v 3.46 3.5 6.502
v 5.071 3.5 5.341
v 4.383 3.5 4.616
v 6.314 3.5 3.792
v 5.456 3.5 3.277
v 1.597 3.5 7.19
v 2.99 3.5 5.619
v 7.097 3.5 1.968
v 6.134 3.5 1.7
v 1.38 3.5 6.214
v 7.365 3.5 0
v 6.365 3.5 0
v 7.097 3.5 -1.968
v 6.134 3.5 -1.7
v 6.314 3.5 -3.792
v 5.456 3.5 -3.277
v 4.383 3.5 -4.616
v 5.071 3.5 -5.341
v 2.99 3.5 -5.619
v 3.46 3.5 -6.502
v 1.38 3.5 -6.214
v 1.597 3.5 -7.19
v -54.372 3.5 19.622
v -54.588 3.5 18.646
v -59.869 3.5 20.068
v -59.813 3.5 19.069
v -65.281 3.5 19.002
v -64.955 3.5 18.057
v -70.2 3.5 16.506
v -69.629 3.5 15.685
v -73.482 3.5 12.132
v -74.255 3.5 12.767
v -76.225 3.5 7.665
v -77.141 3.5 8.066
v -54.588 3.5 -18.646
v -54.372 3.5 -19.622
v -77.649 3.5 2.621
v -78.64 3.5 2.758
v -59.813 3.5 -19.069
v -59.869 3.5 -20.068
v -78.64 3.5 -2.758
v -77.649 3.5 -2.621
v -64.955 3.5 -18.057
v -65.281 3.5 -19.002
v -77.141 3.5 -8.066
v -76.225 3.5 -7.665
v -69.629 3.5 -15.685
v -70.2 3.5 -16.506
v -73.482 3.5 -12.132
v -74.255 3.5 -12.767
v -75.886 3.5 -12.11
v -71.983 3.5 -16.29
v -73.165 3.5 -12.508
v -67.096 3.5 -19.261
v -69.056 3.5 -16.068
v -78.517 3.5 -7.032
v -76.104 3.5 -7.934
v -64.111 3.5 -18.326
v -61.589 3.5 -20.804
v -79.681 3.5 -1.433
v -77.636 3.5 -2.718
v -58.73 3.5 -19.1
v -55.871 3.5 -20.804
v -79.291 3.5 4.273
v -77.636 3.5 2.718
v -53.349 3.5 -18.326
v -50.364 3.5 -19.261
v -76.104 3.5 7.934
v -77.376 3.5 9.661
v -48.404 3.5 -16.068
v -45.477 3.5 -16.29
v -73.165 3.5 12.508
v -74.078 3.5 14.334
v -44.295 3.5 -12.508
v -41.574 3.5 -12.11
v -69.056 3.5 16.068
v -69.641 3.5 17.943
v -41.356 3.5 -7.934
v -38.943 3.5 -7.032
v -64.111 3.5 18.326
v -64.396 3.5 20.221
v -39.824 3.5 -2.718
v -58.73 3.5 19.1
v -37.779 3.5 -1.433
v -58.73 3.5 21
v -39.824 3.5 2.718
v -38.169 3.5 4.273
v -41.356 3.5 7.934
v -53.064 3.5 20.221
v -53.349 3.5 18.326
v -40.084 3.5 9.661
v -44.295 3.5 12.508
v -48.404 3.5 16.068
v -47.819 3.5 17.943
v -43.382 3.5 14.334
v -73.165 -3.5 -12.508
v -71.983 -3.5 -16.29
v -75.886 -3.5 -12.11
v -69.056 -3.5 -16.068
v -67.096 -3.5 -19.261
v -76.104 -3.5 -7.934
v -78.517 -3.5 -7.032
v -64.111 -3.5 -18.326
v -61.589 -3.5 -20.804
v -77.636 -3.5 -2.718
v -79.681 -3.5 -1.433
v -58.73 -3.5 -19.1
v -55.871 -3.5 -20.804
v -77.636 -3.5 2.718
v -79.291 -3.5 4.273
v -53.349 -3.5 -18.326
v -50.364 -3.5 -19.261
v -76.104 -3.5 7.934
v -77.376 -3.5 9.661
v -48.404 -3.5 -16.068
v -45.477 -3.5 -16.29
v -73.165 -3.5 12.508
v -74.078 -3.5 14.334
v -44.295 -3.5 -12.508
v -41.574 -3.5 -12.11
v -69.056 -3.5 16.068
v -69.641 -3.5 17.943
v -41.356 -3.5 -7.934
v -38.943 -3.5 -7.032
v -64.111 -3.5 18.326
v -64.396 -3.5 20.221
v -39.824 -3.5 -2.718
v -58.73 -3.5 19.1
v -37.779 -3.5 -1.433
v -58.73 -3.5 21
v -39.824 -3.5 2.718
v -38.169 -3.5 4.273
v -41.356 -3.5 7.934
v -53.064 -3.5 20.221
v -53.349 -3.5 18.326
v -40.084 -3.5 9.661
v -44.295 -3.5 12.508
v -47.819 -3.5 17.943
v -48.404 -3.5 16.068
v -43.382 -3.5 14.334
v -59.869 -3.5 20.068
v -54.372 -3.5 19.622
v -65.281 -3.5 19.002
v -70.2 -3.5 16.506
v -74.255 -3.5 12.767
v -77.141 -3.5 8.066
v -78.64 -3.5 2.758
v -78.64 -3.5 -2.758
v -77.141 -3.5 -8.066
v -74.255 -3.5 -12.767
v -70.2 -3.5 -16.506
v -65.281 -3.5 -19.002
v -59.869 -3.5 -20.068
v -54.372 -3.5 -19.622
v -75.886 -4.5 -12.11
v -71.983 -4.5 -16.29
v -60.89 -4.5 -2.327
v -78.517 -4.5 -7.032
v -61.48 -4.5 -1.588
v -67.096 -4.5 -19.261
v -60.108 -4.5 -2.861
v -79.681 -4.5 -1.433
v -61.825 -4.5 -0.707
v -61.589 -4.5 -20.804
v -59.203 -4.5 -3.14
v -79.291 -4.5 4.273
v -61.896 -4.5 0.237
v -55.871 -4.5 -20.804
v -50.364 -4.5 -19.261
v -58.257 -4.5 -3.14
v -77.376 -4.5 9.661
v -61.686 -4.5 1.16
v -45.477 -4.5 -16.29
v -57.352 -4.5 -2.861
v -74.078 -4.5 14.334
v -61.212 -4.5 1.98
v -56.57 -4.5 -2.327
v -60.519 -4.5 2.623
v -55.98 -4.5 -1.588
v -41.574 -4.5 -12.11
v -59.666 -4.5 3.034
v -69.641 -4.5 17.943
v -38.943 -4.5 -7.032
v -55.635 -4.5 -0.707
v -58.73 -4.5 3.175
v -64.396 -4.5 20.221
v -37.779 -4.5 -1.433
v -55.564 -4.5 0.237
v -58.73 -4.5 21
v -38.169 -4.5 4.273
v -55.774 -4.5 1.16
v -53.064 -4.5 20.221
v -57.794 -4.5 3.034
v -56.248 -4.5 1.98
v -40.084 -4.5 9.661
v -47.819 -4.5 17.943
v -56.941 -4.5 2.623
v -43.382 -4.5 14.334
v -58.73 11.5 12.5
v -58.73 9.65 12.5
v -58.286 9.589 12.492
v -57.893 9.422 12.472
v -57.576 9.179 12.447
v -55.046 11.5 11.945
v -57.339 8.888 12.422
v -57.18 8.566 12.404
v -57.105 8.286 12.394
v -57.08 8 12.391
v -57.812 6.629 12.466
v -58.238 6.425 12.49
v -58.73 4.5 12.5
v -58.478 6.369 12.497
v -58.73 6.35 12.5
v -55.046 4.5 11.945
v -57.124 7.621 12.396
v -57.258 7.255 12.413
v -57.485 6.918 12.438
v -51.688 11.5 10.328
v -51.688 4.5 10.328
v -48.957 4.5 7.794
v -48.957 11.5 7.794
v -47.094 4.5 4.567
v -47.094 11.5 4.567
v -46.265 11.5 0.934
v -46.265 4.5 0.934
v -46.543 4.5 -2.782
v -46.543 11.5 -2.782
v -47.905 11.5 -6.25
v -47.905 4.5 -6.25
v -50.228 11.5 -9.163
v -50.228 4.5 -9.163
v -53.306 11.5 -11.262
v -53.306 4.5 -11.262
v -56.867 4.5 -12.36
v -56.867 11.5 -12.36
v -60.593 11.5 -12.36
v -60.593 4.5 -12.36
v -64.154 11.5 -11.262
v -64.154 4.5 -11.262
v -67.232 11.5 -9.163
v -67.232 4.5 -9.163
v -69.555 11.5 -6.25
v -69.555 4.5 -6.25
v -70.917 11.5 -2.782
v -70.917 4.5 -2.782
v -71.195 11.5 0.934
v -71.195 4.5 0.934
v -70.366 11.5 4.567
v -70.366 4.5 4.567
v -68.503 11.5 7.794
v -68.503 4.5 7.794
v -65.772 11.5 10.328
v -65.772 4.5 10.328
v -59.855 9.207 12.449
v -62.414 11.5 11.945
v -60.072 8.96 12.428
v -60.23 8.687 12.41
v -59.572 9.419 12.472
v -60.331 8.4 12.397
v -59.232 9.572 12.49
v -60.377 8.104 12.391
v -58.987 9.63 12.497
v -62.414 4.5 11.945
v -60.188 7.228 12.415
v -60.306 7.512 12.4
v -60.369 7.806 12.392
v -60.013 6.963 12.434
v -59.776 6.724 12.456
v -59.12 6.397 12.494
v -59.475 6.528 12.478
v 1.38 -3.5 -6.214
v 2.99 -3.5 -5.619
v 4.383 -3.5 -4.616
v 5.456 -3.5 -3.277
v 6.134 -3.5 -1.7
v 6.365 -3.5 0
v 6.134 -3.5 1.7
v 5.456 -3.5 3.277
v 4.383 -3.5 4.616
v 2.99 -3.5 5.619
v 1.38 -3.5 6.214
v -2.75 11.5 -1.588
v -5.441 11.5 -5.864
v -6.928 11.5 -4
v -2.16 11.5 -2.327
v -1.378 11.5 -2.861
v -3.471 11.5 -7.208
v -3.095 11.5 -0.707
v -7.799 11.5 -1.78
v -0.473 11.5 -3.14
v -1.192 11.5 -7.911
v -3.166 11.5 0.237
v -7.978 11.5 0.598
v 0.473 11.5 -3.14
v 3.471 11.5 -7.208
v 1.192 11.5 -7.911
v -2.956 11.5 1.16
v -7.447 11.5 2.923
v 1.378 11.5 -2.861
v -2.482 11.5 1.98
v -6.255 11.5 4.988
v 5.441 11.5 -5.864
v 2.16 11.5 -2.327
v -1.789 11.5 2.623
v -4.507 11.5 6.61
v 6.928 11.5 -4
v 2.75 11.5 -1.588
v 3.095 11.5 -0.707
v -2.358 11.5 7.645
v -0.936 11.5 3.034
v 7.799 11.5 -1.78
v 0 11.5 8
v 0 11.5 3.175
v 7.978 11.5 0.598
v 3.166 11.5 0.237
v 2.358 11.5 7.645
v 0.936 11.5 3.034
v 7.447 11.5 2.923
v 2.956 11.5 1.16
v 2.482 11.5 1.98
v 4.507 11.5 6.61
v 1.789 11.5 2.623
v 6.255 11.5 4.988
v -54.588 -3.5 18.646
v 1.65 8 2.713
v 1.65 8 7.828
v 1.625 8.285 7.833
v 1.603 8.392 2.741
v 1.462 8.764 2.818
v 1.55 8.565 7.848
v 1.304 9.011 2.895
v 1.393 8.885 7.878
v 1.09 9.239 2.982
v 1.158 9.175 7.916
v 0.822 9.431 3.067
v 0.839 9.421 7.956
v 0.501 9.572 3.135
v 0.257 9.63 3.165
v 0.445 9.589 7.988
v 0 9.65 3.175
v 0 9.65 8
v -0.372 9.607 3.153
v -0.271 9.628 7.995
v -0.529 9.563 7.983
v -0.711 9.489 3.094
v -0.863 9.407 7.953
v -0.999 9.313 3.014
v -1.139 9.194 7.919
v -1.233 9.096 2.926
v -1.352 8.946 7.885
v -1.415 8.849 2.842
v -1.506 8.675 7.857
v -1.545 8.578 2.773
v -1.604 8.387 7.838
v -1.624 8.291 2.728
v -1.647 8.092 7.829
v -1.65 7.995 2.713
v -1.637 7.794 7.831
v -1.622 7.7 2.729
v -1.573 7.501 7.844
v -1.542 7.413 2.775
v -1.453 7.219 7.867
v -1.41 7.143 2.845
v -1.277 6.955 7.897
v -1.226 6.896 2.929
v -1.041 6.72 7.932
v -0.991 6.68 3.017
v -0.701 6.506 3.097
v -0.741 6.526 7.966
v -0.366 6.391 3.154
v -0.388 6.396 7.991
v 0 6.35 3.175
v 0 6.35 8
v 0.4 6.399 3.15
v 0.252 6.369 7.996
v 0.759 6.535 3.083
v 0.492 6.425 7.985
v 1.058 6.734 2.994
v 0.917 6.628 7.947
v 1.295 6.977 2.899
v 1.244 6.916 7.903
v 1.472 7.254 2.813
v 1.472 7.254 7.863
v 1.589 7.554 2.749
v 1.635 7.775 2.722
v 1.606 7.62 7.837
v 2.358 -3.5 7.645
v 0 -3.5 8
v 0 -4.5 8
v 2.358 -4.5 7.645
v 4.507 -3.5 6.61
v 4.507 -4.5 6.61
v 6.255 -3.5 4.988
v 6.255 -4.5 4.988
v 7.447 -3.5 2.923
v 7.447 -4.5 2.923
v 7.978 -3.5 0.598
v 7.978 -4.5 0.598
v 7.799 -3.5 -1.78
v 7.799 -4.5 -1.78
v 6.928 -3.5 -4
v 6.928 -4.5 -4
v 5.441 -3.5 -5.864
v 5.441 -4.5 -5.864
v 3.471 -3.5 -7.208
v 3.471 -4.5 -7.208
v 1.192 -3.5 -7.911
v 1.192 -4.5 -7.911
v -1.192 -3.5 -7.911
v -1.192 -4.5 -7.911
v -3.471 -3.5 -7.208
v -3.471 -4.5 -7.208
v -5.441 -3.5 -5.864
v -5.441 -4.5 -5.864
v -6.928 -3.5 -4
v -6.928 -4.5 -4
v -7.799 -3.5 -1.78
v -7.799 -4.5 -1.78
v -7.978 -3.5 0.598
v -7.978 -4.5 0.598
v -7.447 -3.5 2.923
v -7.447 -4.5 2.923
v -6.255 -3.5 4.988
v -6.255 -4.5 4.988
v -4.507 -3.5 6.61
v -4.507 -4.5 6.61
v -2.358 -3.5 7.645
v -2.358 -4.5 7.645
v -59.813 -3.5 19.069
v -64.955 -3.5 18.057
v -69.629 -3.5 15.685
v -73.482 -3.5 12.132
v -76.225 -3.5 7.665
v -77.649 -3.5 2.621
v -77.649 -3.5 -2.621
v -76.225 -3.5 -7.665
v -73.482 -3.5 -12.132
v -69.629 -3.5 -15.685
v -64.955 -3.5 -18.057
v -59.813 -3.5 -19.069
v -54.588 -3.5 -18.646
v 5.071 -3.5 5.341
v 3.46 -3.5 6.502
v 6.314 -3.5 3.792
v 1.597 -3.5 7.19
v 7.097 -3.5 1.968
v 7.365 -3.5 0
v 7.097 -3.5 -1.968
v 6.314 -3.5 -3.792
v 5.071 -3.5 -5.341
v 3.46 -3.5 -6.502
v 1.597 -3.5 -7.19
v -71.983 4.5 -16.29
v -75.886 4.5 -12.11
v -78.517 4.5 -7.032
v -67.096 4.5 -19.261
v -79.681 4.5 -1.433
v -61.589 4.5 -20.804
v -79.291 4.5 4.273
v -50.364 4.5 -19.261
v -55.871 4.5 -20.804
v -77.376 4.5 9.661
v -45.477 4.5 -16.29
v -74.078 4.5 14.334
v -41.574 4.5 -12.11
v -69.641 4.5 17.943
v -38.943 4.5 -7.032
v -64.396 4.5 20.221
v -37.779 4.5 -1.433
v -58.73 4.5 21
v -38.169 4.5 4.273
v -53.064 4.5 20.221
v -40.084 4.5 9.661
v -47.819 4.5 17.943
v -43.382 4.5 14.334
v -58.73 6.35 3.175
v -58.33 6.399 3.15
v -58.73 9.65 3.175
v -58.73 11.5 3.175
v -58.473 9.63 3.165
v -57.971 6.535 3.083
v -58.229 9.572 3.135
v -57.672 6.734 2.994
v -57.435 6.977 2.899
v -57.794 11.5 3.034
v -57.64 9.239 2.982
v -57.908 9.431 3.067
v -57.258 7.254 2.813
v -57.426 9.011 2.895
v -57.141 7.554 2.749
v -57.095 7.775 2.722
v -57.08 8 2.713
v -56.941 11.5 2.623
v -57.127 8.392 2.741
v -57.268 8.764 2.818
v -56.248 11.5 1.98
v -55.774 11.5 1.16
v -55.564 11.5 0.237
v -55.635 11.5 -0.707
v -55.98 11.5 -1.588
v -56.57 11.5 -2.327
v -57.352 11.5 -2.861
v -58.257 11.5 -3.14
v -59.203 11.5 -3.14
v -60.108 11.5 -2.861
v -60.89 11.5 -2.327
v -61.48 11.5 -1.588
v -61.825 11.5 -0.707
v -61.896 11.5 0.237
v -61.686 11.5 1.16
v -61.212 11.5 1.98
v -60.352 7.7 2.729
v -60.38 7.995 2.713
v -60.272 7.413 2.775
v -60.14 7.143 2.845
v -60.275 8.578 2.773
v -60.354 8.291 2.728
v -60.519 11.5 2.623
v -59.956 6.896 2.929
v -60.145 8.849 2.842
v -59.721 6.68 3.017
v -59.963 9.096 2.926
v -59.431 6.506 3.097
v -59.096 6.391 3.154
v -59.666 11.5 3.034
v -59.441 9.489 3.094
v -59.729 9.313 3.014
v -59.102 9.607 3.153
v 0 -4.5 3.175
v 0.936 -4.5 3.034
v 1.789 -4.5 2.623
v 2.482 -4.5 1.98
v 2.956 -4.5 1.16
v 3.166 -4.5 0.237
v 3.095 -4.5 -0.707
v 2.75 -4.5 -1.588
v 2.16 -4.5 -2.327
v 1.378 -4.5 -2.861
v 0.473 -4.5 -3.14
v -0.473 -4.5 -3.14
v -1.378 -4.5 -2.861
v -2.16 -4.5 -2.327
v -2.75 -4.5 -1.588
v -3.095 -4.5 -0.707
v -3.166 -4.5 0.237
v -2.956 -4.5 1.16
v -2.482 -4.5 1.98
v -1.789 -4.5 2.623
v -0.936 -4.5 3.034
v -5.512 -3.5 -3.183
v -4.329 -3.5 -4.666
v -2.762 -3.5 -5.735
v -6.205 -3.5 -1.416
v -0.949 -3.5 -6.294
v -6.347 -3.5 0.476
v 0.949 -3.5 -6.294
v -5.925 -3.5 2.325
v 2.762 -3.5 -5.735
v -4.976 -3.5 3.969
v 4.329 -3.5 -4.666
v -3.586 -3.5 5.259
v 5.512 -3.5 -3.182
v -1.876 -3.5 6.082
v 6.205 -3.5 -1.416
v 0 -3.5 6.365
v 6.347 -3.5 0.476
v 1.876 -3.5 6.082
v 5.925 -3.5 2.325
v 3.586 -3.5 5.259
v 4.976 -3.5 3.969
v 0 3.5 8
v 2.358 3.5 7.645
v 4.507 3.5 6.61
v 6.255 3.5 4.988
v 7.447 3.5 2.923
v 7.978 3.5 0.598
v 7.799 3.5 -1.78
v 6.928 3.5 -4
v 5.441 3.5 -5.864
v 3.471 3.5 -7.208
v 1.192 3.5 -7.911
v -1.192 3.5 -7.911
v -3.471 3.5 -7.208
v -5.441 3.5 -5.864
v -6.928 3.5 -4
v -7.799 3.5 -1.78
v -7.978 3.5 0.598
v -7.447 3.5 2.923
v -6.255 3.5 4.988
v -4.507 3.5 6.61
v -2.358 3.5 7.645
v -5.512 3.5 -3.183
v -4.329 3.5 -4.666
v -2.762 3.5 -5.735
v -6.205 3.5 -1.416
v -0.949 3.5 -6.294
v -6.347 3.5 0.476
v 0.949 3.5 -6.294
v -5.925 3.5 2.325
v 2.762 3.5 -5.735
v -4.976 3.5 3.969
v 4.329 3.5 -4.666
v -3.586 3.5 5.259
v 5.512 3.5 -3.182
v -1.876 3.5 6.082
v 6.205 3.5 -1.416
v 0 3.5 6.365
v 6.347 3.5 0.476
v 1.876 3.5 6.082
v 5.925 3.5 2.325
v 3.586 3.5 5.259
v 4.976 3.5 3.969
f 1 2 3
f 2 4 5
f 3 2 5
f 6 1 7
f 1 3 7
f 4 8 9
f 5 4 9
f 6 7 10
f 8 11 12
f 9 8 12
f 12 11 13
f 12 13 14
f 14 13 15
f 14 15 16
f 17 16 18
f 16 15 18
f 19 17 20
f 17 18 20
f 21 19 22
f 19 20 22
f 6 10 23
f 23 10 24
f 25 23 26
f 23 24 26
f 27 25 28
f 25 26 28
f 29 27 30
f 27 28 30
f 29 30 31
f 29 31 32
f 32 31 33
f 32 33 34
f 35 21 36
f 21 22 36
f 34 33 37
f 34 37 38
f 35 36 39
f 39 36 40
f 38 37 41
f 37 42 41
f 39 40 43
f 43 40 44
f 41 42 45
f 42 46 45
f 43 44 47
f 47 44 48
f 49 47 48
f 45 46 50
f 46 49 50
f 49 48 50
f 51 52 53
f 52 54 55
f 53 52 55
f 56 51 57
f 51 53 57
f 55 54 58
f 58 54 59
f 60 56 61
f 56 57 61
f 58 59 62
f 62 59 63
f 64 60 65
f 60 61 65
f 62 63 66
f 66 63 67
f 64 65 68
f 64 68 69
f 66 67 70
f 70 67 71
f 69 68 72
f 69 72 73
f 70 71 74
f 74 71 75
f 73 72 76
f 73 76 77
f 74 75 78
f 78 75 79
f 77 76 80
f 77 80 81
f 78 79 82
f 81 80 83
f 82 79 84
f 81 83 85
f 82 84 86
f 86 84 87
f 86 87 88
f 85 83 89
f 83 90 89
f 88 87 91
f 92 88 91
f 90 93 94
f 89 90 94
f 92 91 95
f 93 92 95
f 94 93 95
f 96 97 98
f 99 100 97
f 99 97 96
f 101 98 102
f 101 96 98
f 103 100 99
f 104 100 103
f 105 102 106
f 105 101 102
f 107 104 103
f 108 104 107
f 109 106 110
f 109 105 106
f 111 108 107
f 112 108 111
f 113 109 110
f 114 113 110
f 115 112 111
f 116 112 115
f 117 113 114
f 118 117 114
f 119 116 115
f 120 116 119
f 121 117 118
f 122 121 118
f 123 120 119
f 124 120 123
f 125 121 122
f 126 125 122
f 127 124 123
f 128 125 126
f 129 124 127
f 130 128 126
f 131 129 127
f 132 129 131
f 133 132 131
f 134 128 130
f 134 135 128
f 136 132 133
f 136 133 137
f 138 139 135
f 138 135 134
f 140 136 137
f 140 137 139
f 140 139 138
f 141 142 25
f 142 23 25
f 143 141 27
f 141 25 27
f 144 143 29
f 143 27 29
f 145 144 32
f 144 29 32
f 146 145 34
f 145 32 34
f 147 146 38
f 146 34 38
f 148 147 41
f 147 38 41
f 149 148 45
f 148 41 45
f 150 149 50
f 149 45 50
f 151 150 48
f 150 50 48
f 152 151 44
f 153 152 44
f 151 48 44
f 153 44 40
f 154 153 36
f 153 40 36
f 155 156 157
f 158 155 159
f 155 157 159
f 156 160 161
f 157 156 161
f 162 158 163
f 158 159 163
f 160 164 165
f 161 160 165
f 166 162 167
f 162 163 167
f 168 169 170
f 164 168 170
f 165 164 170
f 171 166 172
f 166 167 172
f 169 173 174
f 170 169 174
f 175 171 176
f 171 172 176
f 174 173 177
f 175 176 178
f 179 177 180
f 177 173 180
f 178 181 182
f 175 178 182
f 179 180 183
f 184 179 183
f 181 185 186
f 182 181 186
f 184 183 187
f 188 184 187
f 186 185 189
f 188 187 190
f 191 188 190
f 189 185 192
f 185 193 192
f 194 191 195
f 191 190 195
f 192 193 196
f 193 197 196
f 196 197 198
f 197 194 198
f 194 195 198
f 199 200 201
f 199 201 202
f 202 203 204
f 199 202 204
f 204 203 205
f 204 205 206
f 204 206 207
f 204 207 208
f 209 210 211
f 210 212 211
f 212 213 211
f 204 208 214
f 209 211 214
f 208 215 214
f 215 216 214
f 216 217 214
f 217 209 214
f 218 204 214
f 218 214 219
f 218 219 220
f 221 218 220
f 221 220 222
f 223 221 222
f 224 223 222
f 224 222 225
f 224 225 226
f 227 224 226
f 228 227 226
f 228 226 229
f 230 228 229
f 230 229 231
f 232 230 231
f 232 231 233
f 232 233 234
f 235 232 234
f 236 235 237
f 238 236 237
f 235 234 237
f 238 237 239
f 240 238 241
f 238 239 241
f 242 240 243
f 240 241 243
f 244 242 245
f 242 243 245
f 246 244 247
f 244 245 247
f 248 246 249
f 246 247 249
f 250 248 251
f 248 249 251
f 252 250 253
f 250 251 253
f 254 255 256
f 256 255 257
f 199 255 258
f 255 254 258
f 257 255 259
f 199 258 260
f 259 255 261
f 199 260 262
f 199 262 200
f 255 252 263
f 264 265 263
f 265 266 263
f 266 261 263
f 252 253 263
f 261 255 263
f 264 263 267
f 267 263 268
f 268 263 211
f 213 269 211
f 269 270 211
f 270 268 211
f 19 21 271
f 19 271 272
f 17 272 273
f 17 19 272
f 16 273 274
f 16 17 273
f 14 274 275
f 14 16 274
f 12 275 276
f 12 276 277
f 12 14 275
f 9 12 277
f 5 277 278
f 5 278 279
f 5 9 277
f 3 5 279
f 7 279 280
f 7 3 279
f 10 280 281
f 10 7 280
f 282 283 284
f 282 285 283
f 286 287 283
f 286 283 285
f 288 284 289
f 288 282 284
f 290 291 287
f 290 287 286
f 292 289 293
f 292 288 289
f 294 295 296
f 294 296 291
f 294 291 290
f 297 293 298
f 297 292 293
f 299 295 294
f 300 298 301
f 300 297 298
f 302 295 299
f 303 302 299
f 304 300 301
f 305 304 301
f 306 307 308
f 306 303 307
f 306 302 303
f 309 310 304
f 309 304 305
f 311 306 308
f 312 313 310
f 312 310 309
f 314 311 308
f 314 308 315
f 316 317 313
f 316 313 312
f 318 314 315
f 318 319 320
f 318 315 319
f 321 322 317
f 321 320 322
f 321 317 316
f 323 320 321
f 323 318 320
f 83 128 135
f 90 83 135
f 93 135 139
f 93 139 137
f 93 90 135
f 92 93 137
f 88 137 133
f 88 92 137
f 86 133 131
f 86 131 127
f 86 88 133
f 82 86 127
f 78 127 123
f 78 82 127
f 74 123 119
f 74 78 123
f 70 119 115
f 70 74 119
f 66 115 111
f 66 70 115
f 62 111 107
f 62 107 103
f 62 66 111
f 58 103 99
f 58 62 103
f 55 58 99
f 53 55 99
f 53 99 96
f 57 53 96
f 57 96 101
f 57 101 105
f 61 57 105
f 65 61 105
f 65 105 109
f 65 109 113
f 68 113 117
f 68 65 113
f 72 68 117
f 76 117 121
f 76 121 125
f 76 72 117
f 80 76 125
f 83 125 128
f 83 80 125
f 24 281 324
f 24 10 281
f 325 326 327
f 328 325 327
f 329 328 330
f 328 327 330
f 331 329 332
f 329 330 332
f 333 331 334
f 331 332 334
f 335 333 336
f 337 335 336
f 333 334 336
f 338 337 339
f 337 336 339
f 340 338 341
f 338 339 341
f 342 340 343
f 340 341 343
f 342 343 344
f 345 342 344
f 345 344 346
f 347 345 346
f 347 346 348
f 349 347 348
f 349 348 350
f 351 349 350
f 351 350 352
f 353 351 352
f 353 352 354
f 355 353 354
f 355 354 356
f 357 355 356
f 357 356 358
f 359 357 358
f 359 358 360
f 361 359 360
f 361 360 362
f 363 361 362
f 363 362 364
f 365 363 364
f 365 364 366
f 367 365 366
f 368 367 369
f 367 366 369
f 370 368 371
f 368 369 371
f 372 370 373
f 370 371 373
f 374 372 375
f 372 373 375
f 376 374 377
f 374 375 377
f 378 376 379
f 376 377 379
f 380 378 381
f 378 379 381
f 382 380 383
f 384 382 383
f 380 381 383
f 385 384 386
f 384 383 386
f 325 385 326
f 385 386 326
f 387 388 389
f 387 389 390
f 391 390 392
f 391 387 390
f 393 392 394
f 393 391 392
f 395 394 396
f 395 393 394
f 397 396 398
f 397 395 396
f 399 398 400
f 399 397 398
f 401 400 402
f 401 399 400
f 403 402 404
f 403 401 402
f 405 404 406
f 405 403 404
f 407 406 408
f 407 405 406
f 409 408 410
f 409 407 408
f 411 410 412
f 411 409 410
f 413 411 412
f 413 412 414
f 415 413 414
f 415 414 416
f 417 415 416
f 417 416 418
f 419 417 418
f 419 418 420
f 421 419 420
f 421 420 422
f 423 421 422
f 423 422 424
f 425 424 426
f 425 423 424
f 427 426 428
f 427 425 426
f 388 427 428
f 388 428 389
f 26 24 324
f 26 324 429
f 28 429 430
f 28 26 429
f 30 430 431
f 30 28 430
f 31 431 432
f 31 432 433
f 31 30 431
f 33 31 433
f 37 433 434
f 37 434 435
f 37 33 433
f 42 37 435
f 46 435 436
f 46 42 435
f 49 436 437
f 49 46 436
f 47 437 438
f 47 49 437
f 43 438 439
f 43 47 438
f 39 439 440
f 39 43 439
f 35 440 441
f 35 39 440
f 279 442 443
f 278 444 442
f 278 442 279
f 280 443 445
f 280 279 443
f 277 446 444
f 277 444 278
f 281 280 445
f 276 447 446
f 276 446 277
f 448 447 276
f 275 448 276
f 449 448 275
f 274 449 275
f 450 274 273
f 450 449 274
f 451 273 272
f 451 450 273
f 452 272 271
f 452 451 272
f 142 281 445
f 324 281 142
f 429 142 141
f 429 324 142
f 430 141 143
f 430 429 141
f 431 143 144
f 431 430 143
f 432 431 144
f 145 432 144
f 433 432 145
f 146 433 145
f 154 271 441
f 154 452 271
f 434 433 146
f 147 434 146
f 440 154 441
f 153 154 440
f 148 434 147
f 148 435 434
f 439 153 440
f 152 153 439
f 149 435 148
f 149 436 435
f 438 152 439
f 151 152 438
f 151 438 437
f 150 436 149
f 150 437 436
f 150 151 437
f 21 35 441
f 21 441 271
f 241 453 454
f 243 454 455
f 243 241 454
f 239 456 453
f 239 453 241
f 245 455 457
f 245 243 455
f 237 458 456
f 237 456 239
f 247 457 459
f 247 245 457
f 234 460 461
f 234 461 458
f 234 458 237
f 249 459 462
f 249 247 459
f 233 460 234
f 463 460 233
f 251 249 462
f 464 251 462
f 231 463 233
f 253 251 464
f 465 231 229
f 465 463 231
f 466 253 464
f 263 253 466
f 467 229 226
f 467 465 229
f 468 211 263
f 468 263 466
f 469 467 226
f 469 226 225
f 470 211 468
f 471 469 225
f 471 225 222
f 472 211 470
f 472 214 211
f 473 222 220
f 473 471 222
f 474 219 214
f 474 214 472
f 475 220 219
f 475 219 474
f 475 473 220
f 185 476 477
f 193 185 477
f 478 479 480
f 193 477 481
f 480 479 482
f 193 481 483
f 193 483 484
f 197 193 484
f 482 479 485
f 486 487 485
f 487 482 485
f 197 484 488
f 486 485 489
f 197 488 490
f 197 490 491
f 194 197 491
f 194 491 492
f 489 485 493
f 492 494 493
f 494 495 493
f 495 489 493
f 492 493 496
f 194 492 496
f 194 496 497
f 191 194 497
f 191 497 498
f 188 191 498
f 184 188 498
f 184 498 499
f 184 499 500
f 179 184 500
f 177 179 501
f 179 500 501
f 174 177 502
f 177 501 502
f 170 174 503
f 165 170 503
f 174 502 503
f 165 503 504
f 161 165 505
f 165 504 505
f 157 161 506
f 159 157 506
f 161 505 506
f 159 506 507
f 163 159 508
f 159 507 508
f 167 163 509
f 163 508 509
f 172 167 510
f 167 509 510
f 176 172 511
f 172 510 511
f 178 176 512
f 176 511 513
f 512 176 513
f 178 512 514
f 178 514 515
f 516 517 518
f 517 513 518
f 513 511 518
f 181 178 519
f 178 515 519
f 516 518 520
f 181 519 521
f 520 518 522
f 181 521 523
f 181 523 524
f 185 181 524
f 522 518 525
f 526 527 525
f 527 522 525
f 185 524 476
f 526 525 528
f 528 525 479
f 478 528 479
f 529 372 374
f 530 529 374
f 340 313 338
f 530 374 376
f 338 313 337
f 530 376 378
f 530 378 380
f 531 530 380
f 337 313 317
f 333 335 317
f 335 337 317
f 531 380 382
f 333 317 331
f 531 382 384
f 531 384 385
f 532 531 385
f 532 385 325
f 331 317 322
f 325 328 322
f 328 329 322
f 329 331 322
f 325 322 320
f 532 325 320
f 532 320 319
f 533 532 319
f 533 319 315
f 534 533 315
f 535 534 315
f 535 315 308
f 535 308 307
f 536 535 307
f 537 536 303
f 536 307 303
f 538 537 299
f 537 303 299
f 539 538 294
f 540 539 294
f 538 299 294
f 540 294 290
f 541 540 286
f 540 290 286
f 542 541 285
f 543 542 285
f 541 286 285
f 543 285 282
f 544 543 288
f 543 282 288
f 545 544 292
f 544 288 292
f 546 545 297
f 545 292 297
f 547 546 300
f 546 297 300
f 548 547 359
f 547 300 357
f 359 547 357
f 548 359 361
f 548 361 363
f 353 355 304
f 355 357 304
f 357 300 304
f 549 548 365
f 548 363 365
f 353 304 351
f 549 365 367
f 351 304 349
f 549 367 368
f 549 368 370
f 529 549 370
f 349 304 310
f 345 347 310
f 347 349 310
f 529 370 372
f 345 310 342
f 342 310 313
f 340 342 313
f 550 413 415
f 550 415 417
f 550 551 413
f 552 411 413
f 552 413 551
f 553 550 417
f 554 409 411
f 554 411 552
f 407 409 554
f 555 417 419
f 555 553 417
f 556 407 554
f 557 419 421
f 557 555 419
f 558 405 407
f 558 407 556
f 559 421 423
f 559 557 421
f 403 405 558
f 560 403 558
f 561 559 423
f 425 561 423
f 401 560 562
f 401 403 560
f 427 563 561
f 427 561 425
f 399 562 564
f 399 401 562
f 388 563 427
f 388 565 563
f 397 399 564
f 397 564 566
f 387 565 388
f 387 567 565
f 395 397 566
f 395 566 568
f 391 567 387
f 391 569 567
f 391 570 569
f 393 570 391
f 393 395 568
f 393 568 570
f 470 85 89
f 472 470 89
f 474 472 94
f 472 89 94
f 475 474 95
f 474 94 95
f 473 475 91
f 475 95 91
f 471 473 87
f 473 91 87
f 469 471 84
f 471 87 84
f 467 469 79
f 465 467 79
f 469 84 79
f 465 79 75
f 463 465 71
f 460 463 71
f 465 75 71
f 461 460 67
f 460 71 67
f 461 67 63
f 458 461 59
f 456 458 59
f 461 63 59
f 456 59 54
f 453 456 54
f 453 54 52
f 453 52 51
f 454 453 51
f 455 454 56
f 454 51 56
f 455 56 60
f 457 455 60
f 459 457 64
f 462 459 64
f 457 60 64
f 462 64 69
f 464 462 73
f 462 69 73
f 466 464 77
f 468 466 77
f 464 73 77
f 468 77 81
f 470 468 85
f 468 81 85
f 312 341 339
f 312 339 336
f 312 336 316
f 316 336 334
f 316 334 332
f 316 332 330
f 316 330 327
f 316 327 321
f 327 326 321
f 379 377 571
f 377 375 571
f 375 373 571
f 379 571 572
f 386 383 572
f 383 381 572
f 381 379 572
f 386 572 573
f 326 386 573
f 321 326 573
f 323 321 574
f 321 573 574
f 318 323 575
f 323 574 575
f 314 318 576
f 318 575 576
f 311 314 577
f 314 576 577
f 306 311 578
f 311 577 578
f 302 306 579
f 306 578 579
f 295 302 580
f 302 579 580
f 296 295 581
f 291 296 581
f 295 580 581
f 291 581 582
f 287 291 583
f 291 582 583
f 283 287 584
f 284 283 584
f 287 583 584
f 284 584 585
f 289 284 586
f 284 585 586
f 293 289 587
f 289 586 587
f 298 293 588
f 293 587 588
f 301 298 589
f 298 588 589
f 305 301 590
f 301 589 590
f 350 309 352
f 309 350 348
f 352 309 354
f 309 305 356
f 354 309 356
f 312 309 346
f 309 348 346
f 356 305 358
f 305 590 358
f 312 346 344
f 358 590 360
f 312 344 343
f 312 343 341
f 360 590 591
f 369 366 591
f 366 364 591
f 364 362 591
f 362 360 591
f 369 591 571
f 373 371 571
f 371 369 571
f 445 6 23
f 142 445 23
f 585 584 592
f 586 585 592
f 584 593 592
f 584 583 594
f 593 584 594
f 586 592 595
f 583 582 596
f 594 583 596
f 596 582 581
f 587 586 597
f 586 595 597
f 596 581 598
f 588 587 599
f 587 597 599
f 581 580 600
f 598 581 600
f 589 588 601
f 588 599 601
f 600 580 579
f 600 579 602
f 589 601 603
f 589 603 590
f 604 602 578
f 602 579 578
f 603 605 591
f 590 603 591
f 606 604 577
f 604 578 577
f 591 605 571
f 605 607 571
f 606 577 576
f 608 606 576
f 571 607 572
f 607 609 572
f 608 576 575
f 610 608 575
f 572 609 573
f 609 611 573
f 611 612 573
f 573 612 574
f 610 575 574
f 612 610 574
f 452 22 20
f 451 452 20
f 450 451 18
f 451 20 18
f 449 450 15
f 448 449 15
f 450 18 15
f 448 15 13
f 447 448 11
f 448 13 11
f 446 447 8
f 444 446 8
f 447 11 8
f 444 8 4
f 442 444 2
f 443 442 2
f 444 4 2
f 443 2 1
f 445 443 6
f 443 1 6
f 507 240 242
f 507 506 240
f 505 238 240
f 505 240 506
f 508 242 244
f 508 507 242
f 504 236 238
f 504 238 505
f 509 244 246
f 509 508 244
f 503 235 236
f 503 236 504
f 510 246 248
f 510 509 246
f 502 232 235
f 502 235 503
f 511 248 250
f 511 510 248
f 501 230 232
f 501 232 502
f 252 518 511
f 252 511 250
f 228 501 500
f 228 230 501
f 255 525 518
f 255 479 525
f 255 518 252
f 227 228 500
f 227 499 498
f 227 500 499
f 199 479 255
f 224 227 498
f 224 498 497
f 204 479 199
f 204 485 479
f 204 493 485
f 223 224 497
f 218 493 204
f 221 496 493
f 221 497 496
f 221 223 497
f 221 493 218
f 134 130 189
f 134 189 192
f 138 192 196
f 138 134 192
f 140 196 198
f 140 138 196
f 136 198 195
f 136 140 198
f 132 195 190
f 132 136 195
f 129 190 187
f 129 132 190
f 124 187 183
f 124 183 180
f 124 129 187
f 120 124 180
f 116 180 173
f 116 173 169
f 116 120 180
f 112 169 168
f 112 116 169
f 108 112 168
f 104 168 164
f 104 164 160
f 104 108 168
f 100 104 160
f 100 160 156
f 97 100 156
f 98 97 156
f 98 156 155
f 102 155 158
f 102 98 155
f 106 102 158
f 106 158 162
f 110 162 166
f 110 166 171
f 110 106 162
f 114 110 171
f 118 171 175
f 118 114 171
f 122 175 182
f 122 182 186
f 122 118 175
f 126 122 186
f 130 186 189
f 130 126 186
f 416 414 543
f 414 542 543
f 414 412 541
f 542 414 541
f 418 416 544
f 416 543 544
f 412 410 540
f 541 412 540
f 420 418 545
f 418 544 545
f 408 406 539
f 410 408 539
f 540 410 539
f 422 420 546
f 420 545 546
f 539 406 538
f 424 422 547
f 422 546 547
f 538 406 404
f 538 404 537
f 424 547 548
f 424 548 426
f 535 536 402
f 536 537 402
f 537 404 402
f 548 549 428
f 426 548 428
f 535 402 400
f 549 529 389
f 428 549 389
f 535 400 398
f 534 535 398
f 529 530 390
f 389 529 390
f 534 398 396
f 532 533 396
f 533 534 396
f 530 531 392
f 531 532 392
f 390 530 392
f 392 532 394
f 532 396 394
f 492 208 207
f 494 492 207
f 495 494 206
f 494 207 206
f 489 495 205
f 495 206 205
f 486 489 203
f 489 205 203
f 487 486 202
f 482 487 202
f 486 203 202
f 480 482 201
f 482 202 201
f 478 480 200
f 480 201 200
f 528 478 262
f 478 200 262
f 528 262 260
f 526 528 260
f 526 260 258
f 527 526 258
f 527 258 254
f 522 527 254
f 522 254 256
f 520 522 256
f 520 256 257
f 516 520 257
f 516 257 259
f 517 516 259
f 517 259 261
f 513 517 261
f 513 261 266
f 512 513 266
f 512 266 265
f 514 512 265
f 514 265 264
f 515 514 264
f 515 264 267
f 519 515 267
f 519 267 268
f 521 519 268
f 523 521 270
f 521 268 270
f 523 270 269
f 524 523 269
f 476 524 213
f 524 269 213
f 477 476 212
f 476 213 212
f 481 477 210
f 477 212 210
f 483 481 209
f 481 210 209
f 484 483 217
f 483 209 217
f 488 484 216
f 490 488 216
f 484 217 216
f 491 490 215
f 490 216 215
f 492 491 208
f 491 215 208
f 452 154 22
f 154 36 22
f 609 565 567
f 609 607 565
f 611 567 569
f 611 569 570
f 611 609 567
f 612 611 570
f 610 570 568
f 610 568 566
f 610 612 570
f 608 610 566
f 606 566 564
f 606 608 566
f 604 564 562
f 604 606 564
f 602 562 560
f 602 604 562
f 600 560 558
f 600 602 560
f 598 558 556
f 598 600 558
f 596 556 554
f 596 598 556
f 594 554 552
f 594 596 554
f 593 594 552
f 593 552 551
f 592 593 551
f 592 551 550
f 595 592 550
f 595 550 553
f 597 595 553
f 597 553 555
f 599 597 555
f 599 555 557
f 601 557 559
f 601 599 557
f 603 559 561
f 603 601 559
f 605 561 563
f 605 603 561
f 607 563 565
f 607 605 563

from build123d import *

# Parameters (mm, degrees)
SKETCH1_R                  = 19.1
BOSS_EXTRUDE1_DEPTH        = 3.5
SKETCH1_R_2                = 6.365
BOSS_EXTRUDE1_2_DEPTH      = 3.5
SKETCH3_R                  = 21
SKETCH3_R_2                = 8
BOSS_EXTRUDE2_DEPTH        = 1
SKETCH4_R                  = 12.5
SKETCH4_R_2                = 8
BOSS_EXTRUDE3_DEPTH        = 7
SKETCH5_R                  = 3.175
CUT_EXTRUDE1_DEPTH         = 84.987337736
M4X0_7_TAPPED_HOLE1_REACH  = 89.243
M4X0_7_TAPPED_HOLE1_BORE_R = 1.65
M4X0_7_TAPPED_HOLE2_REACH  = 87.616
M4X0_7_TAPPED_HOLE2_BORE_R = 1.65
EXTRUDE_THIN1_DEPTH        = 3.5


with BuildPart() as part:
    # Sketch1 → Boss-Extrude1 (new body)
    with BuildSketch(Plane(origin=(0, 0, 0), x_dir=(1, 0, 0), z_dir=(0, 1, 0))):
        with Locations(Location((-58.73, 0, 0), (0, 0, 270))):
            Circle(SKETCH1_R)
    extrude(amount=BOSS_EXTRUDE1_DEPTH)



with BuildPart() as body_2:
    # Sketch1 → Boss-Extrude1 2 (new body)
    with BuildSketch(Plane(origin=(0, 0, 0), x_dir=(1, 0, 0), z_dir=(0, 1, 0))):
        with Locations(Location((0, 0, 0), (0, 0, 270))):
            Circle(SKETCH1_R_2)
    extrude(amount=BOSS_EXTRUDE1_2_DEPTH)


with BuildPart() as part_1:
    add(part.part)

    add(body_2.part)  # Boss-Extrude2 merges body 2
    # Sketch3 → Boss-Extrude2 (add)
    with BuildSketch(Plane(origin=(0, 3.5, 0), x_dir=(1, 0, 0), z_dir=(0, 1, 0))):
        with Locations(Location((-58.73, 0, 0), (0, 0, 270))):
            Circle(SKETCH3_R)
        with Locations(Location((0, 0, 0), (0, 0, 270))):
            Circle(SKETCH3_R_2)
    extrude(amount=BOSS_EXTRUDE2_DEPTH)

    # Mirror1: part across plane


with BuildPart() as part_2:
    add(part_1.part)
    add(part_1.part.mirror(Plane.ZX))

    # Sketch4 → Boss-Extrude3 (add)
    with BuildSketch(Plane(origin=(0, 4.5, 0), x_dir=(1, 0, 0), z_dir=(0, 1, 0))):
        with Locations(Location((-58.73, 0, 0), (0, 0, 270))):
            Circle(SKETCH4_R)
        with Locations(Location((0, 0, 0), (0, 0, 270))):
            Circle(SKETCH4_R_2)
    extrude(amount=BOSS_EXTRUDE3_DEPTH)

    # Sketch5 → Cut-Extrude1 (cut, through all)
    with BuildSketch(Plane(origin=(0, 11.5, 0), x_dir=(1, 0, 0), z_dir=(0, 1, 0))):
        with Locations(Location((0, 0, 0), (0, 0, 270))):
            Circle(SKETCH5_R)
        with Locations(Location((-58.73, 0, 0), (0, 0, 270))):
            Circle(SKETCH5_R)
    extrude(amount=-CUT_EXTRUDE1_DEPTH, mode=Mode.SUBTRACT)

    # M4x0.7 Tapped Hole1 bore → M4x0.7 Tapped Hole1 (cut, up to next)
    with BuildSketch(Plane.XY.offset(12.5), mode=Mode.PRIVATE) as m4x0_7_tapped_hole1_sk1:
        with Locations((-58.73, 8)):
            Circle(M4X0_7_TAPPED_HOLE1_BORE_R)
    m4x0_7_tapped_hole1_tool1 = extrude(m4x0_7_tapped_hole1_sk1.sketch, amount=-M4X0_7_TAPPED_HOLE1_REACH, mode=Mode.PRIVATE) & part_2.part
    add(m4x0_7_tapped_hole1_tool1.solids().sort_by_distance((-58.73, 8, 12.5))[0], mode=Mode.SUBTRACT)

    # M4x0.7 Tapped Hole2 bore → M4x0.7 Tapped Hole2 (cut, up to next)
    with BuildSketch(Plane.XY.offset(8), mode=Mode.PRIVATE) as m4x0_7_tapped_hole2_sk1:
        with Locations((0, 8)):
            Circle(M4X0_7_TAPPED_HOLE2_BORE_R)
    m4x0_7_tapped_hole2_tool1 = extrude(m4x0_7_tapped_hole2_sk1.sketch, amount=-M4X0_7_TAPPED_HOLE2_REACH, mode=Mode.PRIVATE) & part_2.part
    add(m4x0_7_tapped_hole2_tool1.solids().sort_by_distance((0, 8, 8))[0], mode=Mode.SUBTRACT)


with BuildPart() as body_2_2:
    # Sketch2 → Extrude-Thin1 (new, symmetric)
    with BuildSketch(Plane(origin=(0, 0, 0), x_dir=(1, 0, 0), z_dir=(0, 1, 0))):
        with BuildLine():
            Line((1.597024945, -7.189766083), (-54.371520518, -19.62176487))
            ThreePointArc((-54.371520518, -19.62176487), (-78.83, 0), (-54.371520518, 19.62176487))
            Line((-54.371520518, 19.62176487), (1.597024945, 7.189766083))
            ThreePointArc((1.597024945, 7.189766083), (7.365, 0), (1.597024945, -7.189766083))
        make_face()
        with BuildLine():
            Line((1.380185169, -6.213558875), (-54.588360293, -18.645557662))
            ThreePointArc((-54.588360293, -18.645557662), (-77.83, 0), (-54.588360293, 18.645557662))
            Line((-54.588360293, 18.645557662), (1.380185169, 6.213558875))
            ThreePointArc((1.380185169, 6.213558875), (6.365, 0), (1.380185169, -6.213558875))
        make_face(mode=Mode.SUBTRACT)
    extrude(amount=EXTRUDE_THIN1_DEPTH, both=True)


solid = Compound([part_2.part, body_2_2.part])
